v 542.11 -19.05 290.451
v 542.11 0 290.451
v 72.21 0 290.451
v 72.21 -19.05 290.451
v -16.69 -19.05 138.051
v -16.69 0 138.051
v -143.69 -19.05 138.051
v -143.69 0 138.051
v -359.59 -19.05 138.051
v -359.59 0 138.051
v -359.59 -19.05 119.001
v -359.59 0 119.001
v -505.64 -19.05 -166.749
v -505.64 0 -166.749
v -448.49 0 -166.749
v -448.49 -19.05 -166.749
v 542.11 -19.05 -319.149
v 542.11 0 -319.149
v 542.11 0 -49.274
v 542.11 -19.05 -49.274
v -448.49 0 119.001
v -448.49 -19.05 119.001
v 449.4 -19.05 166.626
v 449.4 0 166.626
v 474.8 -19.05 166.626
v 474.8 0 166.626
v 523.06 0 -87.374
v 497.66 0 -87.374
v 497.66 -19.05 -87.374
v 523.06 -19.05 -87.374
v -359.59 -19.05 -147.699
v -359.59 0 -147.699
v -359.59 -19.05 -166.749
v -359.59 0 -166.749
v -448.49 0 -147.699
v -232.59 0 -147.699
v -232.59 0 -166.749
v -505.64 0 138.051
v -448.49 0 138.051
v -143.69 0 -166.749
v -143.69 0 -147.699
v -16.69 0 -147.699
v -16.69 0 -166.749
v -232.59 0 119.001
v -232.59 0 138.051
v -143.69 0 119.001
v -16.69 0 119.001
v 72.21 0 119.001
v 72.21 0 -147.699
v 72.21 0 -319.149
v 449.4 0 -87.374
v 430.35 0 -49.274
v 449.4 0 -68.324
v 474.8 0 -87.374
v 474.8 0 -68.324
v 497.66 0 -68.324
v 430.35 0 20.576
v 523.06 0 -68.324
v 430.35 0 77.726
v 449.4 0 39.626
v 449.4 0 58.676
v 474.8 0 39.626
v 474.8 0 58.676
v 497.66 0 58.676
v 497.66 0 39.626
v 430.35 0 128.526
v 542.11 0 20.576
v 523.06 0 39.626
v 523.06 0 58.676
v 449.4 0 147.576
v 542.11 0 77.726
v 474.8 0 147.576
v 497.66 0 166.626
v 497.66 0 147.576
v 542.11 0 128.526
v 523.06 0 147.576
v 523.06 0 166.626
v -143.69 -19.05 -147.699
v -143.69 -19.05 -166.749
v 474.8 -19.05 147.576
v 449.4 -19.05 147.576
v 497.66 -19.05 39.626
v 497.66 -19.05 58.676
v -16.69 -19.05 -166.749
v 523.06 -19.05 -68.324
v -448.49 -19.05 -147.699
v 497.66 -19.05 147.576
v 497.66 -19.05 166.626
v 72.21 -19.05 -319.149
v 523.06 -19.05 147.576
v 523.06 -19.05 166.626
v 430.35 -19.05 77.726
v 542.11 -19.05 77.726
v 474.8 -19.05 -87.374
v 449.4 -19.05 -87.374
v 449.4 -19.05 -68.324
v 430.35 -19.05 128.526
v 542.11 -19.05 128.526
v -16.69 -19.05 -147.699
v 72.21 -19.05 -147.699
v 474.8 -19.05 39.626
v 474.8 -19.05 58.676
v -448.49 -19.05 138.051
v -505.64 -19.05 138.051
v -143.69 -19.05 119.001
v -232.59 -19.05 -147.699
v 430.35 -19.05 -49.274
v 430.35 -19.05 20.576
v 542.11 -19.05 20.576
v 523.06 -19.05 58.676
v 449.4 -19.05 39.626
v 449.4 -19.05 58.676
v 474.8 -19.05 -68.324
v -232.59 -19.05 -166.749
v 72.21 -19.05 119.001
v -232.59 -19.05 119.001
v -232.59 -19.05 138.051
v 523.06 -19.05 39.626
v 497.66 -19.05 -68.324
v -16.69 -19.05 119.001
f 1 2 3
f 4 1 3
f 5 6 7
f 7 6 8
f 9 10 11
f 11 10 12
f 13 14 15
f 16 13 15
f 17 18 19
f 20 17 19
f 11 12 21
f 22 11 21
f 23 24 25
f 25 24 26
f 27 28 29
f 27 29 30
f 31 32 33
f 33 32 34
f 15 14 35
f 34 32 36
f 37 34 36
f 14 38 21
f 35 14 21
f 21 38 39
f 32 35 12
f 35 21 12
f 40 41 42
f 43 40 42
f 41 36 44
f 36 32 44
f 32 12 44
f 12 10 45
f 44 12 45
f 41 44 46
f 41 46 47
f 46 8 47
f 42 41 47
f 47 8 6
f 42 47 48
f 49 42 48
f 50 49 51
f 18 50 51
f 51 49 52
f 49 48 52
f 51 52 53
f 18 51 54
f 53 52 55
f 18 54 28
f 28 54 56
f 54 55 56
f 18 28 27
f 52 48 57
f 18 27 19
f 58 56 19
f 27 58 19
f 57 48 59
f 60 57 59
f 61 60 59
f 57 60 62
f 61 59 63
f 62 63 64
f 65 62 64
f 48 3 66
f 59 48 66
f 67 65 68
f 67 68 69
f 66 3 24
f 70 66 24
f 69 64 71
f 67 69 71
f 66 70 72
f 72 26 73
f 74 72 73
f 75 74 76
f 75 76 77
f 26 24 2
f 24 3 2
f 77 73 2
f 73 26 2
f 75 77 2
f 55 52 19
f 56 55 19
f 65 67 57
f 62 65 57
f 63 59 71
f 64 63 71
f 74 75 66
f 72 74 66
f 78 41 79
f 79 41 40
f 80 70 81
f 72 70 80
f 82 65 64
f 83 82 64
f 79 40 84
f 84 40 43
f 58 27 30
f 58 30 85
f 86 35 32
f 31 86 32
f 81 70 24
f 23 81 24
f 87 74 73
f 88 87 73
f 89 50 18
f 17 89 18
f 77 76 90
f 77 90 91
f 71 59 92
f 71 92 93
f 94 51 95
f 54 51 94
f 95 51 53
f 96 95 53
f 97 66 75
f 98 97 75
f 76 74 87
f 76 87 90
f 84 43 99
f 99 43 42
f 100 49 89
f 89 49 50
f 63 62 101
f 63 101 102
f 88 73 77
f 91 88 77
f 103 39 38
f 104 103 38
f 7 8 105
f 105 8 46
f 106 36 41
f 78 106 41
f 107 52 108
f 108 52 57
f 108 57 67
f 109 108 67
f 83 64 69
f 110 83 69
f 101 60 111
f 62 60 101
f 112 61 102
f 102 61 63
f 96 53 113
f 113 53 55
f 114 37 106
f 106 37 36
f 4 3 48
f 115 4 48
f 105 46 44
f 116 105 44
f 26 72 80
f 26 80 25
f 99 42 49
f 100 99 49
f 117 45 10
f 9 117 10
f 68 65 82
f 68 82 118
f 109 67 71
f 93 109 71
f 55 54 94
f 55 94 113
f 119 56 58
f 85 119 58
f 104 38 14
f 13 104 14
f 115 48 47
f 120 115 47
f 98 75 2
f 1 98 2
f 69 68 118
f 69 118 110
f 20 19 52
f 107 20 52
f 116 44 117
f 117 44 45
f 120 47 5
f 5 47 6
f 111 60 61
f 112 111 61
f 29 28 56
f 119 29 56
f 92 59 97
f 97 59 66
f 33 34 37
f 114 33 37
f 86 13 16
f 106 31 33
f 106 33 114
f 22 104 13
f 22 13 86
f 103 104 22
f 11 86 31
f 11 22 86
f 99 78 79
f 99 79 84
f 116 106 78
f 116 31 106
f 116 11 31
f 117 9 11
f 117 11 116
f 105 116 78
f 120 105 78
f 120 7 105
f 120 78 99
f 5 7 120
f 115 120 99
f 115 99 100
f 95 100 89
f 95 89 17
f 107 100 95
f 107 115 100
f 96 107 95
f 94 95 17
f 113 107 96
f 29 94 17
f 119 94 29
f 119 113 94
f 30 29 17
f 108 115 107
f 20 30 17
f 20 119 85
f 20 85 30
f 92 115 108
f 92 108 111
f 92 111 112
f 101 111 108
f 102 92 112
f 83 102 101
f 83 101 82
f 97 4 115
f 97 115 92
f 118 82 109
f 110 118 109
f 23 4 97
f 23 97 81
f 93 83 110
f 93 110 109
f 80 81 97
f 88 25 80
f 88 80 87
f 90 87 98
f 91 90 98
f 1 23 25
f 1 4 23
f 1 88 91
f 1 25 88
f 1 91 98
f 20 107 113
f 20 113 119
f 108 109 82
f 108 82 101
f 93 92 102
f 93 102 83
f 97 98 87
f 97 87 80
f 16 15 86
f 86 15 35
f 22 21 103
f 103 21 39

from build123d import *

# Parameters (mm, degrees)
F0_W     = 25.4
F0_H     = 19.05
F0_W_2   = 469.9
F0_H_2   = 152.4
F0_W_3   = 111.76
F0_H_3   = 57.15
F1_DEPTH = 19.05


# Not quite as in the source:
# - a feature names something its author has since deleted; it is built from what else it names


with BuildPart() as f1:
    # F0 (on Front) → F1 (new body)
    with BuildSketch(Plane.XZ):
        Polygon((-448.4900477648, 138.0508303034), (-505.6400477648, 138.0508303034), (-505.6400477648, -166.7491696966), (-448.4900477648, -166.7491696966), (-448.4900477648, -147.6991696966), (-359.5900477648, -147.6991696966), (-359.5900477648, -166.7491696966), (-232.5900477648, -166.7491696966), (-232.5900477648, -147.6991696966), (-143.6900477648, -147.6991696966), (-143.6900477648, -166.7491696966), (-16.6900477648, -166.7491696966), (-16.6900477648, -147.6991696966), (72.2099522352, -147.6991696966), (72.2099522352, -166.7491696966), (542.1099522352, -166.7491696966), (542.1099522352, -49.2741696966), (523.0599522352, -49.2741696966), (497.6599522352, -49.2741696966), (474.7999522352, -49.2741696966), (449.3999522352, -49.2741696966), (430.3499522352, -49.2741696966), (430.3499522352, -23.8741696966), (430.3499522352, 20.5758303034), (430.3499522352, 77.7258303034), (430.3499522352, 90.4258303034), (430.3499522352, 128.5258303034), (449.3999522352, 128.5258303034), (474.7999522352, 128.5258303034), (497.6599522352, 128.5258303034), (523.0599522352, 128.5258303034), (542.1099522352, 128.5258303034), (542.1099522352, 138.0508303034), (474.7999522352, 138.0508303034), (449.3999522352, 138.0508303034), (72.2099522352, 138.0508303034), (72.2099522352, 119.0008303034), (-16.6900477648, 119.0008303034), (-16.6900477648, 138.0508303034), (-143.6900477648, 138.0508303034), (-143.6900477648, 119.0008303034), (-232.5900477648, 119.0008303034), (-232.5900477648, 138.0508303034), (-359.5900477648, 138.0508303034), (-359.5900477648, 119.0008303034), (-448.4900477648, 119.0008303034), align=None)
        with Locations((462.0999522352, -77.8491696966)):
            Rectangle(F0_W, F0_H, mode=Mode.SUBTRACT)
        with Locations((510.3599522352, -77.8491696966)):
            Rectangle(F0_W, F0_H, mode=Mode.SUBTRACT)
        with Locations((307.1599522352, -242.9491696966)):
            Rectangle(F0_W_2, F0_H_2)
        Polygon((72.2099522352, 290.4508303034), (72.2099522352, 138.0508303034), (449.3999522352, 138.0508303034), (474.7999522352, 138.0508303034), (542.1099522352, 138.0508303034), (542.1099522352, 290.4508303034), align=None)
        with Locations((462.0999522352, 157.1008303034)):
            Rectangle(F0_W, F0_H, mode=Mode.SUBTRACT)
        with Locations((510.3599522352, 157.1008303034)):
            Rectangle(F0_W, F0_H, mode=Mode.SUBTRACT)
        with Locations((486.2299522352, 49.1508303034)):
            Rectangle(F0_W_3, F0_H_3)
        with Locations((462.0999522352, 49.1508303034)):
            Rectangle(F0_W, F0_H, mode=Mode.SUBTRACT)
        with Locations((510.3599522352, 49.1508303034)):
            Rectangle(F0_W, F0_H, mode=Mode.SUBTRACT)
    extrude(amount=F1_DEPTH)


solid = f1.part
